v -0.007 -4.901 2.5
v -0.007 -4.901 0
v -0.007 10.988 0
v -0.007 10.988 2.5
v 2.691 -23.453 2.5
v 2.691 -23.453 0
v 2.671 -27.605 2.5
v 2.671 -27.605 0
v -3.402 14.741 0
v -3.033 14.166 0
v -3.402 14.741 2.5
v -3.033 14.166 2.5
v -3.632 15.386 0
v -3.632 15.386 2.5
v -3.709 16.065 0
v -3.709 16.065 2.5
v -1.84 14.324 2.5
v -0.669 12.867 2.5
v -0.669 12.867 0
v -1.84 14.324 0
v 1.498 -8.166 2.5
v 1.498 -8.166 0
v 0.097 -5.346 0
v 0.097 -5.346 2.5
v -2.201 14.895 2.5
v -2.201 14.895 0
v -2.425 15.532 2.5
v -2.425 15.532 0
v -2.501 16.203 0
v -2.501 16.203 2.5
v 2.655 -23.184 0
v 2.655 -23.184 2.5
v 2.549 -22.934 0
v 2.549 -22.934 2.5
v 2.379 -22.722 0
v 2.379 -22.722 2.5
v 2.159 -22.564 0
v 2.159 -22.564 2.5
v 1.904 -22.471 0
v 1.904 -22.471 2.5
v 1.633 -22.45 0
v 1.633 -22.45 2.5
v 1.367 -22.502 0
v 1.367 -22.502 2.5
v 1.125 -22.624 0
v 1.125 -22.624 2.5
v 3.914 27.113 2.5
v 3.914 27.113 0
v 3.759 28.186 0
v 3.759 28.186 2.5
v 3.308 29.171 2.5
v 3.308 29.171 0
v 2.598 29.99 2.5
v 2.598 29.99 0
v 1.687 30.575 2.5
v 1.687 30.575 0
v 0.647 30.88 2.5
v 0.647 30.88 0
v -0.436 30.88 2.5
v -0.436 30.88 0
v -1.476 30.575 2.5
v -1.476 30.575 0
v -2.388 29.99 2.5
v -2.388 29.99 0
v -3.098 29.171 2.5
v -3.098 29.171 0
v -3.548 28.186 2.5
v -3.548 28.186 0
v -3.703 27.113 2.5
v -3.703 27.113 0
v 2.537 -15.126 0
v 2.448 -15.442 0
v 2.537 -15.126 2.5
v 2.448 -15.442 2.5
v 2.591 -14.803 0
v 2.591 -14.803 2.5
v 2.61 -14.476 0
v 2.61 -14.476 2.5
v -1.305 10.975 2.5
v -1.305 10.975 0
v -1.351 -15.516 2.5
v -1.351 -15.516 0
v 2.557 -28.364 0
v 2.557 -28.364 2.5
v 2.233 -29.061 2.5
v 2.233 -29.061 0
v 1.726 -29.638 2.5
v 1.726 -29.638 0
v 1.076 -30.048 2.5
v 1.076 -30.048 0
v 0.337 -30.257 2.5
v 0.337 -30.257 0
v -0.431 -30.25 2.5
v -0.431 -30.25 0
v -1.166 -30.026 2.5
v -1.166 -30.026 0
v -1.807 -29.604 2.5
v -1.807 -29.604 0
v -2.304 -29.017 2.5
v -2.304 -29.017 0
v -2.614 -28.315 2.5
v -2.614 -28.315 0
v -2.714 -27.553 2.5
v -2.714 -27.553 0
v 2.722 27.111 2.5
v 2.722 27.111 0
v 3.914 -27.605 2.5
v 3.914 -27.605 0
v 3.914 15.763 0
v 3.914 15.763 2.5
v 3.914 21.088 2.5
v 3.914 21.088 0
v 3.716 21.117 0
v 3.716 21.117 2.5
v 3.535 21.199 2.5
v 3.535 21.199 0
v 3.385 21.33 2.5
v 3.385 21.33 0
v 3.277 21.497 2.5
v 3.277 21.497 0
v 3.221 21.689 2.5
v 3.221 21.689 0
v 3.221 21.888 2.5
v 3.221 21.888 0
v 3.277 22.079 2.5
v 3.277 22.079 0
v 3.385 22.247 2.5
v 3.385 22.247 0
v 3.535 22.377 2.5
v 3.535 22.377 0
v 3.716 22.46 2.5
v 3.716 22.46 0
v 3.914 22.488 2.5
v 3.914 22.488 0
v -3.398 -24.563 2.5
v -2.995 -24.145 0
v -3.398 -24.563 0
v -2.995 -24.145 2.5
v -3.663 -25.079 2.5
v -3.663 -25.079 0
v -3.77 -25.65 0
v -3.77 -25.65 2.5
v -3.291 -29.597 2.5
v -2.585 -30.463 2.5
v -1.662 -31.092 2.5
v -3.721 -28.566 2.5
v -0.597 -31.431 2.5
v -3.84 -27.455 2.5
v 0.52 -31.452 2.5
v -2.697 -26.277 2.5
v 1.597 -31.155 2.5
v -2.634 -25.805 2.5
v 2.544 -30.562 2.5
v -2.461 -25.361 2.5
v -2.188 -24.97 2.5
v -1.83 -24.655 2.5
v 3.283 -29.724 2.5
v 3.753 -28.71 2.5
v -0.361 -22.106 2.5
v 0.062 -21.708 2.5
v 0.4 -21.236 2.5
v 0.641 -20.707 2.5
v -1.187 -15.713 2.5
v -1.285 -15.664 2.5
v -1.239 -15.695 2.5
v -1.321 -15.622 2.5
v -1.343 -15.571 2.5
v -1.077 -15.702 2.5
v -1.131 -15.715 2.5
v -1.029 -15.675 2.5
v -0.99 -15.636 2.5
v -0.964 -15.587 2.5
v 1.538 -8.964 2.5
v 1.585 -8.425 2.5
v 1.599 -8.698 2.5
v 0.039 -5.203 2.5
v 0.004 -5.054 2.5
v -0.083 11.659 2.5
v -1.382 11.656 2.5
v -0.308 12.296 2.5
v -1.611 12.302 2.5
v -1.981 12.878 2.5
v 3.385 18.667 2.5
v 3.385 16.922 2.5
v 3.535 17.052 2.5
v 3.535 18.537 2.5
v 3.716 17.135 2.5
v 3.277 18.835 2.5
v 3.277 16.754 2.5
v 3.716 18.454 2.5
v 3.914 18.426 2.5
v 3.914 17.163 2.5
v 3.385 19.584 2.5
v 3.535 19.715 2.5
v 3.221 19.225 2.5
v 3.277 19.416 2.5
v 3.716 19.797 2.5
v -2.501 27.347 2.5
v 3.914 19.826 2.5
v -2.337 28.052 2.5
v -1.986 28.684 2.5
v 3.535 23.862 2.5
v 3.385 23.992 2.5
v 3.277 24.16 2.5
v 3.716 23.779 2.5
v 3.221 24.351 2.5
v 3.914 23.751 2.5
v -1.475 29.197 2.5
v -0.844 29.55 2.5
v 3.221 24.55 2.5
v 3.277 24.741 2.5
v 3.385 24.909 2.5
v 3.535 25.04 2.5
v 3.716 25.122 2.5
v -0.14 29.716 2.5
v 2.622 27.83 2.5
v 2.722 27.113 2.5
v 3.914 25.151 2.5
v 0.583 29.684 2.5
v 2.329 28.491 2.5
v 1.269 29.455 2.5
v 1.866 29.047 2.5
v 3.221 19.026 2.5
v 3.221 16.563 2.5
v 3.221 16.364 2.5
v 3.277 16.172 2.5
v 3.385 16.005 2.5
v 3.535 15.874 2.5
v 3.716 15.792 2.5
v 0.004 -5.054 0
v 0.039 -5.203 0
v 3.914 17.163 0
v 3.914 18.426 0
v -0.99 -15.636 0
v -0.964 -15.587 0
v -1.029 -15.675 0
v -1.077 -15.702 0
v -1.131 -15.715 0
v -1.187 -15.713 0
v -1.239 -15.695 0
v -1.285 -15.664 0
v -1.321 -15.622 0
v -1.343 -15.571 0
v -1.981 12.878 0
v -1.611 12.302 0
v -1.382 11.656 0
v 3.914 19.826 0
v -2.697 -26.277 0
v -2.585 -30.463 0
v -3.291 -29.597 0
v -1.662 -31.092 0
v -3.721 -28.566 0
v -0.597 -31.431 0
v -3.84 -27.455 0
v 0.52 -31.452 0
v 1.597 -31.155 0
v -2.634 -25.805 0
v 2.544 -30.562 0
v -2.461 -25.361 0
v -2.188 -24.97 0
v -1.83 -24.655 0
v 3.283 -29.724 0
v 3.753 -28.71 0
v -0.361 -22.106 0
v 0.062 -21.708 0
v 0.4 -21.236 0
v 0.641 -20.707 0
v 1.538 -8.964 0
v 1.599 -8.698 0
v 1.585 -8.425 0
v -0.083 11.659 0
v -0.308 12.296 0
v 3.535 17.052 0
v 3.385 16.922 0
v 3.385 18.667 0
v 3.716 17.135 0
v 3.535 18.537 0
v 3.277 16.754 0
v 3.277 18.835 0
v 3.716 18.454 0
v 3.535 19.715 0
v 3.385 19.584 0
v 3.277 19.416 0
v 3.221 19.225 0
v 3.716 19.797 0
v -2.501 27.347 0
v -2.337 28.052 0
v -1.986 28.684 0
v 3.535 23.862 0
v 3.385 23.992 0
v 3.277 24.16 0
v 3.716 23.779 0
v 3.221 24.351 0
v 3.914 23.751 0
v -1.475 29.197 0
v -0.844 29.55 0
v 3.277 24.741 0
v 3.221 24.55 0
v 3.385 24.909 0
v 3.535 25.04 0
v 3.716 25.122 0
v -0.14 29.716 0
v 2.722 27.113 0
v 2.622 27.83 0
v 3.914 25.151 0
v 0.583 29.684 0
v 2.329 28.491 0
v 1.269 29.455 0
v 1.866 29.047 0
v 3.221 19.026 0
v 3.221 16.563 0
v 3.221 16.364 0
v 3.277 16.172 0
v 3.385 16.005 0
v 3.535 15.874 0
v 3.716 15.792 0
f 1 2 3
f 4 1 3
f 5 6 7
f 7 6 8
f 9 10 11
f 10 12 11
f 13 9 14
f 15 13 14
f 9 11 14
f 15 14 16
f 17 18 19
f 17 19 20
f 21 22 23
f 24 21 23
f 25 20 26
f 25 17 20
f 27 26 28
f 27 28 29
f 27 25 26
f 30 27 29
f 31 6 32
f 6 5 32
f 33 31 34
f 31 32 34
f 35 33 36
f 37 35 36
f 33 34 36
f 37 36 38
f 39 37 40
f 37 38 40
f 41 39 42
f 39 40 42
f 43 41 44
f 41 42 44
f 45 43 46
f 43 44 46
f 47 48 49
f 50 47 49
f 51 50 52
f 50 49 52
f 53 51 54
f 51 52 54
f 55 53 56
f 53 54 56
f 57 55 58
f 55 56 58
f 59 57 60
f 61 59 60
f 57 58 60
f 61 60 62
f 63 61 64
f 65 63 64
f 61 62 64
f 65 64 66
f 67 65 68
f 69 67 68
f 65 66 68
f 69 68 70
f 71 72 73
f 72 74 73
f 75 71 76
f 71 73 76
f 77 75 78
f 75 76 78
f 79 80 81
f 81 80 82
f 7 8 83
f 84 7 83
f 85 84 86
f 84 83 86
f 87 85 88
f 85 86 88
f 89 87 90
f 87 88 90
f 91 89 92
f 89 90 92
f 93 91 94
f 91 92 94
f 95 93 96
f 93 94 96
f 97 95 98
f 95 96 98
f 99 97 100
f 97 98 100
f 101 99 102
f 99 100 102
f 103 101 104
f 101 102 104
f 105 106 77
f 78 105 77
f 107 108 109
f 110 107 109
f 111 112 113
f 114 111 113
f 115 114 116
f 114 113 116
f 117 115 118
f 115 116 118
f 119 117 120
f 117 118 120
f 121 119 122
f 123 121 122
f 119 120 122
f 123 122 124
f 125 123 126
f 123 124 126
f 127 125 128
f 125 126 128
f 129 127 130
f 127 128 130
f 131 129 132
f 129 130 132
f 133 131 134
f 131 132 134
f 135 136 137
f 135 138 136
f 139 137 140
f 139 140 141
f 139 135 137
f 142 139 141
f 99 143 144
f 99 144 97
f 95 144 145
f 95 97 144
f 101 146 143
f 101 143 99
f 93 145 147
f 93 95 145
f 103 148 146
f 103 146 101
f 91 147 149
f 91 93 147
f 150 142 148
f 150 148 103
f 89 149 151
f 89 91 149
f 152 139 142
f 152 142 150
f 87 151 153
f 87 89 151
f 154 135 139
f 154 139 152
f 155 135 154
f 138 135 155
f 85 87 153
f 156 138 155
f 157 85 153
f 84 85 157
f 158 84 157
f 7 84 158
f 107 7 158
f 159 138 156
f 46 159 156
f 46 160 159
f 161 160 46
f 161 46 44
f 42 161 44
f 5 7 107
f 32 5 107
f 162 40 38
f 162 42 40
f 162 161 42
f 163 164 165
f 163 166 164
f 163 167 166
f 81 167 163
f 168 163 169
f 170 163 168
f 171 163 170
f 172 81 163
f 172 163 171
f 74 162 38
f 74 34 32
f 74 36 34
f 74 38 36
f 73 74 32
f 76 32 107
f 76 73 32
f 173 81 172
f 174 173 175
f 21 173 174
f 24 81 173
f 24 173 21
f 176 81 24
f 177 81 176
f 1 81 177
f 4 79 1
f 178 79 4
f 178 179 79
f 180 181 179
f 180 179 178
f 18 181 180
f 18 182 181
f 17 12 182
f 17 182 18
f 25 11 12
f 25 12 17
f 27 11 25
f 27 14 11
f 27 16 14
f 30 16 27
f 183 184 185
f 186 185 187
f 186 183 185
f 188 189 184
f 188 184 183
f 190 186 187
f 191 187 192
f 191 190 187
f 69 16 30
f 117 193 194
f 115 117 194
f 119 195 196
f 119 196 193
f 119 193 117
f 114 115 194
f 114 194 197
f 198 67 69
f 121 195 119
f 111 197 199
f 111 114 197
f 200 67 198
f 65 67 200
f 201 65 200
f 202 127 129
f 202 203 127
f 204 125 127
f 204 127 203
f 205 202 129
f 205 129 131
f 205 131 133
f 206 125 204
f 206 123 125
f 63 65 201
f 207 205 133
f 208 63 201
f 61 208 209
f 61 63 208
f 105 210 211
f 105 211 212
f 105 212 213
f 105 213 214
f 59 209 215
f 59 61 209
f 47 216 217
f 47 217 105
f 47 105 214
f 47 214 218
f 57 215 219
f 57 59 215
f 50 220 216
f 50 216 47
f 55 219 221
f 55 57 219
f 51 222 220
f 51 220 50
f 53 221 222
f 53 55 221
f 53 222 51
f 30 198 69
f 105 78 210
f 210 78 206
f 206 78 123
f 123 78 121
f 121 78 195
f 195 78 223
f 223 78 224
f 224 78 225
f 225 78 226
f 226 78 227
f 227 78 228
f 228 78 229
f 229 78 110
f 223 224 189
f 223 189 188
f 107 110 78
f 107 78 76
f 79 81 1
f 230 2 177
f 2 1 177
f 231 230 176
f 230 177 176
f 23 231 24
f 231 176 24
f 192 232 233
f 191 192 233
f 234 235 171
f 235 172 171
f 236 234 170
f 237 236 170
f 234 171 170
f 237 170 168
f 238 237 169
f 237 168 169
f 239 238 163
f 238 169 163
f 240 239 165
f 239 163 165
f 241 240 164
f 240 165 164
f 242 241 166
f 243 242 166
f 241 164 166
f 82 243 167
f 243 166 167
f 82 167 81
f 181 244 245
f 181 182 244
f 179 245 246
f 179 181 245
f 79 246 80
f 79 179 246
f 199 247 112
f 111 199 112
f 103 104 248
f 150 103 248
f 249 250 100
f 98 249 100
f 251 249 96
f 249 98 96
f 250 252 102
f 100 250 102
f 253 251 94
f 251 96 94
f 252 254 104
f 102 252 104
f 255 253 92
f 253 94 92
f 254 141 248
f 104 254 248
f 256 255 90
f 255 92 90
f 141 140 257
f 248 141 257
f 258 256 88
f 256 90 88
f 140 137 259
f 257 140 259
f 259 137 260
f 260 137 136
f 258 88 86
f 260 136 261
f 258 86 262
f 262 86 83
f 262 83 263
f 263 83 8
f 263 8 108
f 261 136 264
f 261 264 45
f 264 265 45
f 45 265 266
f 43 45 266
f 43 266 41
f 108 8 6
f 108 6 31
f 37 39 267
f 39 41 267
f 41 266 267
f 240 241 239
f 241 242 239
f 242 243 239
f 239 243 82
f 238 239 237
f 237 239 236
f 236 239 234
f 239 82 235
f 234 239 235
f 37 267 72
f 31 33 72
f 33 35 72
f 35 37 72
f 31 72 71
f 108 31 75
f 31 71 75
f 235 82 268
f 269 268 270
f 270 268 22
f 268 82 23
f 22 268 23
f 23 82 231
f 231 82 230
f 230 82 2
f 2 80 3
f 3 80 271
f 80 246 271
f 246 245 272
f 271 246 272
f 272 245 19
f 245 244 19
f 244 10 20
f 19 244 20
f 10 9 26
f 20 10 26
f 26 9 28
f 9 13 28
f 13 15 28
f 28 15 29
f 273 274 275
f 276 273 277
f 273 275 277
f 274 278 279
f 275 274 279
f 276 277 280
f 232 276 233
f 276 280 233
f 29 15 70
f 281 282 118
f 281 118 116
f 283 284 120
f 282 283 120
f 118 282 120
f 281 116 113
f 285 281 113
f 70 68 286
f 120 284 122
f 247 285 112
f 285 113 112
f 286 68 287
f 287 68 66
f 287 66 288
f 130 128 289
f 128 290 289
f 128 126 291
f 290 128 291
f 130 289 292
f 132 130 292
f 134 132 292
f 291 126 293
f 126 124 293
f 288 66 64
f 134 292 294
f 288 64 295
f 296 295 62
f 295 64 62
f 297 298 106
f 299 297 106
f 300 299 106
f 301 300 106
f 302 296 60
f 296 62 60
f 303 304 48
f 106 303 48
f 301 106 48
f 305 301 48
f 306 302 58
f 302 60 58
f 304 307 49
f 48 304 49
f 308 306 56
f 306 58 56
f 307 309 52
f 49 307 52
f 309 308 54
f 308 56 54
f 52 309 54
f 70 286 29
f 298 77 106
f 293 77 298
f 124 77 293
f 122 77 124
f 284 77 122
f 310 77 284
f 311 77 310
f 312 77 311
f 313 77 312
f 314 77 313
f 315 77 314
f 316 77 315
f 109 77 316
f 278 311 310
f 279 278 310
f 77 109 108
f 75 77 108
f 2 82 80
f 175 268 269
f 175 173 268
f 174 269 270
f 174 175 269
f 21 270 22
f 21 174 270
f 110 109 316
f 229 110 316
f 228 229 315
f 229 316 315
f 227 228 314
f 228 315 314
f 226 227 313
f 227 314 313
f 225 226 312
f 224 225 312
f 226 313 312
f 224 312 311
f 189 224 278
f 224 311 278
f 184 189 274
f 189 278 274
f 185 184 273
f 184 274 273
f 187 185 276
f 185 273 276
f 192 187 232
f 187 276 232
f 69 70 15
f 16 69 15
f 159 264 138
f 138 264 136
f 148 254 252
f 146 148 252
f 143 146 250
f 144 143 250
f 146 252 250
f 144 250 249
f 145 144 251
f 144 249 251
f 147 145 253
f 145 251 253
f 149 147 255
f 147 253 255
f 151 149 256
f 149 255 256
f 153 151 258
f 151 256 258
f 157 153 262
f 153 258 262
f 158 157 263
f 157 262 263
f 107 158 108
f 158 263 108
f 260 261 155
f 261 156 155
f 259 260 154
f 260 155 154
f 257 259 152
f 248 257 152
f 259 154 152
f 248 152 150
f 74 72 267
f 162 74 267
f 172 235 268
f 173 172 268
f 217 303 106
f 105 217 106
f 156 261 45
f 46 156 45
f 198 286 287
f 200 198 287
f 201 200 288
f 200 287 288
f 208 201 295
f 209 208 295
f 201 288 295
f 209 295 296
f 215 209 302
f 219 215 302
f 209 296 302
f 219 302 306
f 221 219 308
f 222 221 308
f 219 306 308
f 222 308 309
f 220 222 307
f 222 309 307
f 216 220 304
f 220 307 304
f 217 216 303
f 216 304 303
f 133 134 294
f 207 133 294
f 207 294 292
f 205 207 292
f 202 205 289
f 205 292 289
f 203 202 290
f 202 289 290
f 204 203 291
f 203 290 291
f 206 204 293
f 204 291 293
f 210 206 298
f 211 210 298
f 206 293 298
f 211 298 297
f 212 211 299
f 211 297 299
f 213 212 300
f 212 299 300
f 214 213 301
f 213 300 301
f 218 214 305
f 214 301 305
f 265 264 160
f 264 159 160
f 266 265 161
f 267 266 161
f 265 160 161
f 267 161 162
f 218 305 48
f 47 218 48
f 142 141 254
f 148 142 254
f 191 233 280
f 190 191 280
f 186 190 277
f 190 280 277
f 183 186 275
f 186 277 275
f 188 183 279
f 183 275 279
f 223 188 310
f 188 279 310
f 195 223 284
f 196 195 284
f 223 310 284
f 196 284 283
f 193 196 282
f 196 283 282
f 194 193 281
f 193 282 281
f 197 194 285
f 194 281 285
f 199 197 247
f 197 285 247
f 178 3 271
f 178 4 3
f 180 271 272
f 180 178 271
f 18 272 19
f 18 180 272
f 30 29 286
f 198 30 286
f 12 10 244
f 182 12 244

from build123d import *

# Parameters (mm, degrees)
F1_DEPTH = 2.5
F2_R     = 1
F3_R     = 0.2
F4_R     = 1
F5_R     = 3
F6_R     = 3
F7_R     = 3
F8_R     = 3
F9_R     = 2
F10_R    = 2
F11_R    = 3
F12_R    = 1


# Not quite as in the source:
# - ends of sketch curves that miss each other by under 0.0002 mm in the source are joined


with BuildPart() as f1:
    # F0 (on Top) → F1 (new body)
    with BuildSketch(Plane.XY):
        with BuildLine():
            Line((-3.7337125044, -24.7166411829), (-3.8395490403, -27.4549634883))
            ThreePointArc((-3.8395490403, -27.4549634883), (-0.0393100387, -31.4820484538), (3.9136249429, -27.6047381979))
            Line((3.9136249429, -27.6047381979), (3.9136249429, 15.7631997109))
            ThreePointArc((3.9136249429, 15.7631997109), (3.2136249429, 16.4631997109), (3.9136249429, 17.1631997109))
            Line((3.9136249429, 17.1631997109), (3.9136249429, 18.4257015441))
            ThreePointArc((3.9136249429, 18.4257015441), (3.2136249429, 19.1257015441), (3.9136249429, 19.8257015441))
            Line((3.9136249429, 19.8257015441), (3.9136249429, 21.0882033773))
            ThreePointArc((3.9136249429, 21.0882033773), (3.2136249429, 21.7882033773), (3.9136249429, 22.4882033773))
            Line((3.9136249429, 22.4882033773), (3.9136249429, 23.7507052105))
            ThreePointArc((3.9136249429, 23.7507052105), (3.2136249429, 24.4507052105), (3.9136249429, 25.1507052105))
            Line((3.9136249429, 25.1507052105), (3.9136249429, 27.1132070437))
            ThreePointArc((3.9136249429, 27.1132070437), (0.1053655494, 30.9191937737), (-3.7028938442, 27.1132070437))
            Line((-3.7028938442, 27.1132070437), (-3.7101279046, 14.9948472524))
            Line((-3.7101279046, 14.9948472524), (-1.3026787113, 12.0476867709))
            Line((-1.3026787113, 12.0476867709), (-1.3526145996, -16.6168491978))
            Line((-1.3526145996, -16.6168491978), (1.6919830966, -8.5560908617))
            Line((1.6919830966, -8.5560908617), (-0.0073911714, -5.1353744853))
            Line((-0.0073911714, -5.1353744853), (-0.0073911714, 12.04390363))
            Line((-0.0073911714, 12.04390363), (-2.5009698886, 15.147203732))
            Line((-2.5009698886, 15.147203732), (-2.5009698886, 27.3470994339))
            ThreePointArc((-2.5009698886, 27.3470994339), (0.2224335348, 29.7253272746), (2.7223778727, 27.1132070292))
            Line((2.7223778727, 27.1132070292), (2.7223883904, 27.1109336758))
            Line((2.7223883904, 27.1109336758), (2.6088146402, -14.972403604))
            Line((2.6088146402, -14.972403604), (0.3495425781, -21.5565683108))
            Line((0.3495425781, -21.5565683108), (-3.7337125044, -24.7166411829))
        make_face()
        with BuildLine():
            ThreePointArc((2.6714254586, -27.6047381979), (-0.0471437397, -30.2812376007), (-2.7139096259, -27.5531197061))
            Line((-2.7139096259, -27.5531197061), (-2.6834930082, -25.2417523976))
            Line((-2.6834930082, -25.2417523976), (2.7000635964, -21.5408525771))
            Line((2.7000635964, -21.5408525771), (2.6714254586, -27.6047381979))
        make_face(mode=Mode.SUBTRACT)
    extrude(amount=F1_DEPTH)

    # F2
    f2_edges = [f1.edges().sort_by_distance(p)[0] for p in [
        (2.700064, -21.540853, 1.25),
    ]]
    fillet(f2_edges, radius=F2_R)

    # F3
    f3_edges = [f1.edges().sort_by_distance(p)[0] for p in [
        (-1.352615, -16.616849, 1.25),
    ]]
    fillet(f3_edges, radius=F3_R)

    # F4
    f4_edges = [f1.edges().sort_by_distance(p)[0] for p in [
        (1.691983, -8.556091, 1.25),
    ]]
    fillet(f4_edges, radius=F4_R)

    # F5
    f5_edges = [f1.edges().sort_by_distance(p)[0] for p in [
        (-2.50097, 15.147204, 1.25),
    ]]
    fillet(f5_edges, radius=F5_R)

    # F6
    f6_edges = [f1.edges().sort_by_distance(p)[0] for p in [
        (-3.710128, 14.994847, 1.25),
    ]]
    fillet(f6_edges, radius=F6_R)

    # F7
    f7_edges = [f1.edges().sort_by_distance(p)[0] for p in [
        (-1.302679, 12.047687, 1.25),
    ]]
    fillet(f7_edges, radius=F7_R)

    # F8
    f8_edges = [f1.edges().sort_by_distance(p)[0] for p in [
        (-0.007391, 12.043904, 1.25),
    ]]
    fillet(f8_edges, radius=F8_R)

    # F9
    f9_edges = [f1.edges().sort_by_distance(p)[0] for p in [
        (-3.733713, -24.716641, 1.25),
    ]]
    fillet(f9_edges, radius=F9_R)

    # F10
    f10_edges = [f1.edges().sort_by_distance(p)[0] for p in [
        (-2.683493, -25.241752, 1.25),
    ]]
    fillet(f10_edges, radius=F10_R)

    # F11
    f11_edges = [f1.edges().sort_by_distance(p)[0] for p in [
        (0.349543, -21.556568, 1.25),
        (2.608815, -14.972404, 1.25),
    ]]
    fillet(f11_edges, radius=F11_R)

    # F12
    f12_edges = [f1.edges().sort_by_distance(p)[0] for p in [
        (-0.007391, -5.135374, 1.25),
    ]]
    fillet(f12_edges, radius=F12_R)


solid = f1.part
